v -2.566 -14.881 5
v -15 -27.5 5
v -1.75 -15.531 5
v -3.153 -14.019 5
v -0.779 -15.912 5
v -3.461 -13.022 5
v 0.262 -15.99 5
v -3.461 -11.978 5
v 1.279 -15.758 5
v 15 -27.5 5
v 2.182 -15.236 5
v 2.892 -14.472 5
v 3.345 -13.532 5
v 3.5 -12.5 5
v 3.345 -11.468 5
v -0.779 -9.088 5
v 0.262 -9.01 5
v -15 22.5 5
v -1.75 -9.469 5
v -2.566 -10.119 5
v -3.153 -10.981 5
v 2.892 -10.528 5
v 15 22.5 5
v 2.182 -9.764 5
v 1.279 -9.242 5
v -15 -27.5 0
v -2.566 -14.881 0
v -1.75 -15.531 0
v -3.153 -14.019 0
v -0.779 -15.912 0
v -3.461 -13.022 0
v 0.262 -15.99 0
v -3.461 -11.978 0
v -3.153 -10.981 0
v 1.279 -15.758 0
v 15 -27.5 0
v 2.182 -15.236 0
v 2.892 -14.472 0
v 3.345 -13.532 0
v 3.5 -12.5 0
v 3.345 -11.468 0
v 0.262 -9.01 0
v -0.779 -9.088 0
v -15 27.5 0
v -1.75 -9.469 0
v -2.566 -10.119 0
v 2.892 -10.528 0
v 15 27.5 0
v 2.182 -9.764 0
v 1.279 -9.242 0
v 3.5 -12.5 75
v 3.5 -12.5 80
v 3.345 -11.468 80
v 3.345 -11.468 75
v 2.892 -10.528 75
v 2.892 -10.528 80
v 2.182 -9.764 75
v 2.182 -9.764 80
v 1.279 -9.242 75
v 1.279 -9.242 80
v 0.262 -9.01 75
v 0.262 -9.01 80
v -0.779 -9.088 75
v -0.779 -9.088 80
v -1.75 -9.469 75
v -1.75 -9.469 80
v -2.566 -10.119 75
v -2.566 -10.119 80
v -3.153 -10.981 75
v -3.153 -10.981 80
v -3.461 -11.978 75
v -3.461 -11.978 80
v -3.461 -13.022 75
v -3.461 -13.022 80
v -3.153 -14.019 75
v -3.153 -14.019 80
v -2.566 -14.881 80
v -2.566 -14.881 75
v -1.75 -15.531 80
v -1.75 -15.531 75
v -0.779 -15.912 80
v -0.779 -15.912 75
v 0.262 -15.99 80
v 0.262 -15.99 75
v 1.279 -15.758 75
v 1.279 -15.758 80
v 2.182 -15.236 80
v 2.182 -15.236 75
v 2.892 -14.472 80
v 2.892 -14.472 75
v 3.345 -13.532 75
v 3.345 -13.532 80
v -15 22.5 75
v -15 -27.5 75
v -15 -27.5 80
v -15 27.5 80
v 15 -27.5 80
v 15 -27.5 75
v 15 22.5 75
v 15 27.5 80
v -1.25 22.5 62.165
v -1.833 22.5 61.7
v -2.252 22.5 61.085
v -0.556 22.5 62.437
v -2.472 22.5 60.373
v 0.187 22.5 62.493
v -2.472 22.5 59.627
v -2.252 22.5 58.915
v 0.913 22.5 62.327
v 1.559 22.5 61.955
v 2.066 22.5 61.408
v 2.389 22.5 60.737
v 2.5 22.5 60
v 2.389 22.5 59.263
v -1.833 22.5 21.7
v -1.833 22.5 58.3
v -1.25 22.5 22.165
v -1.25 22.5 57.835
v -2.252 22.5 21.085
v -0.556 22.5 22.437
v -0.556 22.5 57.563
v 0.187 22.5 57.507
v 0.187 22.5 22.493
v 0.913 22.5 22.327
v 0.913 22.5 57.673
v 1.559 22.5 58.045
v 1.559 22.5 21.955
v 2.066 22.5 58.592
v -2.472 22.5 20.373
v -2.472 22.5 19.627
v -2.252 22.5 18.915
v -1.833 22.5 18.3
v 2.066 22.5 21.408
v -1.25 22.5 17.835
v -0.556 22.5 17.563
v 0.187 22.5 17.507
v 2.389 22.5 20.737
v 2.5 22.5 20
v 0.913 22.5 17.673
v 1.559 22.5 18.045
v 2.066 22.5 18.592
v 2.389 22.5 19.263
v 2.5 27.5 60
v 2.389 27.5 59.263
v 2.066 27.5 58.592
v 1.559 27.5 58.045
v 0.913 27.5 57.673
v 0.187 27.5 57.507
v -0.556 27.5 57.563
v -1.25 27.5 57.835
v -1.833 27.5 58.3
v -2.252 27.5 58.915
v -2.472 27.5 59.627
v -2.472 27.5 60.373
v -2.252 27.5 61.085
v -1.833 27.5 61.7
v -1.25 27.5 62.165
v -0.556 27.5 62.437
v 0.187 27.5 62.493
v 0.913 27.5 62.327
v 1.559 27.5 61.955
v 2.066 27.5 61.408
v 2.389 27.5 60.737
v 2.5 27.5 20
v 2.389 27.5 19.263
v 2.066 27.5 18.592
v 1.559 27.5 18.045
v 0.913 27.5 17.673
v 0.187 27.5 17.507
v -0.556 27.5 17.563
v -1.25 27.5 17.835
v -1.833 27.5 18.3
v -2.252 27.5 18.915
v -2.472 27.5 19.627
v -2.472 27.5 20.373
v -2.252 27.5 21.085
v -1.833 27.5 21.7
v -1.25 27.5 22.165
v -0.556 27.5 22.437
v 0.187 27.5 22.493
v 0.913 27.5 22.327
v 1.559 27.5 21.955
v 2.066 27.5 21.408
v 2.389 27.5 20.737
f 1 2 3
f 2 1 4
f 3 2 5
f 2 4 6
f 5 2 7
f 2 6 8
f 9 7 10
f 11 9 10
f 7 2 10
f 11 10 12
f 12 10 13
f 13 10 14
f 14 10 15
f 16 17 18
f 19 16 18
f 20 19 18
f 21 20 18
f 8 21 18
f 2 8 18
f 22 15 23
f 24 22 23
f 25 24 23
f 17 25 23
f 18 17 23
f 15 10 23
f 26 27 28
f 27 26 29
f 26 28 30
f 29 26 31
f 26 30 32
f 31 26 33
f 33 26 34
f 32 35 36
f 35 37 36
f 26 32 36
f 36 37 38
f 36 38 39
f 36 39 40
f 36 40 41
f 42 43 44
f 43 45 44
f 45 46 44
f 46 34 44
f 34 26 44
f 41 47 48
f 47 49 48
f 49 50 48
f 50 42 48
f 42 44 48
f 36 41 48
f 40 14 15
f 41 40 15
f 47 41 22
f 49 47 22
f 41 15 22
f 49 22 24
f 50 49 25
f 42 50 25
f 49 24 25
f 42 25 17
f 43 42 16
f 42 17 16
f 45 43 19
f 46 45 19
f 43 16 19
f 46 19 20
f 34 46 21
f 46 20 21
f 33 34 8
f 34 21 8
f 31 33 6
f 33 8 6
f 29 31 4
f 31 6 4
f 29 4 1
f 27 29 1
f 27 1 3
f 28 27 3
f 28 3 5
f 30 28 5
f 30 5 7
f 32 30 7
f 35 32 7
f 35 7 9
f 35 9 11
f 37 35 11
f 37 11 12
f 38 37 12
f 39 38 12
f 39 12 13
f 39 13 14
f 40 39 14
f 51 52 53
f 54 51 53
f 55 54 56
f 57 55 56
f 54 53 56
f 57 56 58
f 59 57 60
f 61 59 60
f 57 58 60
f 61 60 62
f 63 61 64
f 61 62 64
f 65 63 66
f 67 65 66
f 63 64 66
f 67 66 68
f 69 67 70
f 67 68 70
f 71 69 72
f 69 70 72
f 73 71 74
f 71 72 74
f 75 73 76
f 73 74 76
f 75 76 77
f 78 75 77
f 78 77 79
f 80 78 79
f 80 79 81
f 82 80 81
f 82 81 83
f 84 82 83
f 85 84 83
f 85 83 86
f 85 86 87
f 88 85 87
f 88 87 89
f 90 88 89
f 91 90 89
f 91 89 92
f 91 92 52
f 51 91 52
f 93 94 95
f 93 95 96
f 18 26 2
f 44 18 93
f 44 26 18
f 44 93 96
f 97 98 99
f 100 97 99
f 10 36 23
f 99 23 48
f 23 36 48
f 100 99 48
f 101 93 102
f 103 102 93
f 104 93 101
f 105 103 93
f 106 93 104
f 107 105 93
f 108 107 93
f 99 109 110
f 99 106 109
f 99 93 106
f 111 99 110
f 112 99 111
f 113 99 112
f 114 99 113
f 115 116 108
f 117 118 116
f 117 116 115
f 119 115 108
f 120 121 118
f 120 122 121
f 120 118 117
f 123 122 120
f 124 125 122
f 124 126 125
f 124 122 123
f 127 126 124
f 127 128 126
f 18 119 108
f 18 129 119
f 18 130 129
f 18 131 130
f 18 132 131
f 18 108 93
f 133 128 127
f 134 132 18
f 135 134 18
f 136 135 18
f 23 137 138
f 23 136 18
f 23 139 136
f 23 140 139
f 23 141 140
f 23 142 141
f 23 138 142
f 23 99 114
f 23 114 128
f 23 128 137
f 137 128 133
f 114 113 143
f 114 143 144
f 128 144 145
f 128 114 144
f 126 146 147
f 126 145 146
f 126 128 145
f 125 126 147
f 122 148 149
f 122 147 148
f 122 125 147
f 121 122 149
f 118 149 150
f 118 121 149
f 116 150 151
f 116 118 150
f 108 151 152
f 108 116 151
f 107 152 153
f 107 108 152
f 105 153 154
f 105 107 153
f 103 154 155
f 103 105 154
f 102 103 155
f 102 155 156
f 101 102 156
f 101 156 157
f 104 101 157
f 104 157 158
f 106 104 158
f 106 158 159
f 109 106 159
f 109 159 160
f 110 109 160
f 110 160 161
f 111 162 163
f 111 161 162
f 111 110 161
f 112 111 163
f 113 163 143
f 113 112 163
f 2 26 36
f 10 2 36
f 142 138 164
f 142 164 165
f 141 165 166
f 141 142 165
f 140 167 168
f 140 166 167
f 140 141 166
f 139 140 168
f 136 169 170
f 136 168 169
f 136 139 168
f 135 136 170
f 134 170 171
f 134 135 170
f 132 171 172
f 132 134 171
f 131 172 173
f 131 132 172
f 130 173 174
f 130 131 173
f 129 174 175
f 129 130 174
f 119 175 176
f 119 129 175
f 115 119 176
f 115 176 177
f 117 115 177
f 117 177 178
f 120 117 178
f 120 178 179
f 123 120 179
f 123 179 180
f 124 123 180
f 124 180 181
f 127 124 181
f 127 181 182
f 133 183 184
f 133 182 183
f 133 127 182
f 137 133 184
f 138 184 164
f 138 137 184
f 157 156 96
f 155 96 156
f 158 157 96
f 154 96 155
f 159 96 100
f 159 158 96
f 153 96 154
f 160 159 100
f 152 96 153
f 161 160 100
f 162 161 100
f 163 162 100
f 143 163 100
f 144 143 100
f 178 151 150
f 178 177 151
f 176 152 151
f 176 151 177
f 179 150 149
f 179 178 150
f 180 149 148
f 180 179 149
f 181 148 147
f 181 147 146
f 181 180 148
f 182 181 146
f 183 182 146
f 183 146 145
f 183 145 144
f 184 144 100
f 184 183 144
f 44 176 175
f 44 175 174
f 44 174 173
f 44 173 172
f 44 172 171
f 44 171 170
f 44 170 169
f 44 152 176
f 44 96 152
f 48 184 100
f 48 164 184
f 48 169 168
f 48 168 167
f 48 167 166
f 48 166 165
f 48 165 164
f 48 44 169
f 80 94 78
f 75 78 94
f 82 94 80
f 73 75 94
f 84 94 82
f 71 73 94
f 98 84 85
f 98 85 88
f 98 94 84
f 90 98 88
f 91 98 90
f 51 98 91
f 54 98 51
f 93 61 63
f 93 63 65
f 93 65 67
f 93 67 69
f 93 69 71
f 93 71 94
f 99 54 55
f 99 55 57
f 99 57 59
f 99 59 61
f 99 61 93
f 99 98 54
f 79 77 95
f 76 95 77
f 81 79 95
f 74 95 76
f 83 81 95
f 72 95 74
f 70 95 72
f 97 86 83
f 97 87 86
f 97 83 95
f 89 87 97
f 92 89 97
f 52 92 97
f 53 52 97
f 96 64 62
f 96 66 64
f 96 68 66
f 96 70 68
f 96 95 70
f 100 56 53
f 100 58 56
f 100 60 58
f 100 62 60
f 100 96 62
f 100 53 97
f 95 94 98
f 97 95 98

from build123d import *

# Parameters (mm, degrees)
SKETCH1_W           = 30
SKETCH1_H           = 55
BOSS_EXTRUDE1_DEPTH = 80
SKETCH2_W           = 70
SKETCH2_H           = 50
CUT_EXTRUDE1_DEPTH  = 60
SKETCH3_R           = 3.5
CUT_EXTRUDE2_DEPTH  = 117
SKETCH4_R           = 2.5
CUT_EXTRUDE3_DEPTH  = 42


with BuildPart() as part:
    # Sketch1 → Boss-Extrude1 (new body)
    with BuildSketch(Plane.XY):
        Rectangle(SKETCH1_W, SKETCH1_H)
    extrude(amount=BOSS_EXTRUDE1_DEPTH)

    # Sketch2 → Cut-Extrude1 (cut)
    with BuildSketch(Plane(origin=(15, 0, 0), x_dir=(0, 0, -1), z_dir=(1, 0, 0))):
        with Locations((-40, -2.5)):
            Rectangle(SKETCH2_W, SKETCH2_H)
    extrude(amount=-CUT_EXTRUDE1_DEPTH, mode=Mode.SUBTRACT)

    # Sketch3 → Cut-Extrude2 (cut)
    with BuildSketch(Plane.XY.offset(80)):
        with Locations((0, -12.5)):
            Circle(SKETCH3_R)
    extrude(amount=-CUT_EXTRUDE2_DEPTH, mode=Mode.SUBTRACT)

    # Sketch4 → Cut-Extrude3 (cut)
    with BuildSketch(Plane(origin=(0, 0, 0), x_dir=(1, 0, 0), z_dir=(0, 1, 0))):
        with Locations((0, -20)):
            Circle(SKETCH4_R)
        with Locations((0, -60)):
            Circle(SKETCH4_R)
    extrude(amount=CUT_EXTRUDE3_DEPTH, mode=Mode.SUBTRACT)


solid = part.part
